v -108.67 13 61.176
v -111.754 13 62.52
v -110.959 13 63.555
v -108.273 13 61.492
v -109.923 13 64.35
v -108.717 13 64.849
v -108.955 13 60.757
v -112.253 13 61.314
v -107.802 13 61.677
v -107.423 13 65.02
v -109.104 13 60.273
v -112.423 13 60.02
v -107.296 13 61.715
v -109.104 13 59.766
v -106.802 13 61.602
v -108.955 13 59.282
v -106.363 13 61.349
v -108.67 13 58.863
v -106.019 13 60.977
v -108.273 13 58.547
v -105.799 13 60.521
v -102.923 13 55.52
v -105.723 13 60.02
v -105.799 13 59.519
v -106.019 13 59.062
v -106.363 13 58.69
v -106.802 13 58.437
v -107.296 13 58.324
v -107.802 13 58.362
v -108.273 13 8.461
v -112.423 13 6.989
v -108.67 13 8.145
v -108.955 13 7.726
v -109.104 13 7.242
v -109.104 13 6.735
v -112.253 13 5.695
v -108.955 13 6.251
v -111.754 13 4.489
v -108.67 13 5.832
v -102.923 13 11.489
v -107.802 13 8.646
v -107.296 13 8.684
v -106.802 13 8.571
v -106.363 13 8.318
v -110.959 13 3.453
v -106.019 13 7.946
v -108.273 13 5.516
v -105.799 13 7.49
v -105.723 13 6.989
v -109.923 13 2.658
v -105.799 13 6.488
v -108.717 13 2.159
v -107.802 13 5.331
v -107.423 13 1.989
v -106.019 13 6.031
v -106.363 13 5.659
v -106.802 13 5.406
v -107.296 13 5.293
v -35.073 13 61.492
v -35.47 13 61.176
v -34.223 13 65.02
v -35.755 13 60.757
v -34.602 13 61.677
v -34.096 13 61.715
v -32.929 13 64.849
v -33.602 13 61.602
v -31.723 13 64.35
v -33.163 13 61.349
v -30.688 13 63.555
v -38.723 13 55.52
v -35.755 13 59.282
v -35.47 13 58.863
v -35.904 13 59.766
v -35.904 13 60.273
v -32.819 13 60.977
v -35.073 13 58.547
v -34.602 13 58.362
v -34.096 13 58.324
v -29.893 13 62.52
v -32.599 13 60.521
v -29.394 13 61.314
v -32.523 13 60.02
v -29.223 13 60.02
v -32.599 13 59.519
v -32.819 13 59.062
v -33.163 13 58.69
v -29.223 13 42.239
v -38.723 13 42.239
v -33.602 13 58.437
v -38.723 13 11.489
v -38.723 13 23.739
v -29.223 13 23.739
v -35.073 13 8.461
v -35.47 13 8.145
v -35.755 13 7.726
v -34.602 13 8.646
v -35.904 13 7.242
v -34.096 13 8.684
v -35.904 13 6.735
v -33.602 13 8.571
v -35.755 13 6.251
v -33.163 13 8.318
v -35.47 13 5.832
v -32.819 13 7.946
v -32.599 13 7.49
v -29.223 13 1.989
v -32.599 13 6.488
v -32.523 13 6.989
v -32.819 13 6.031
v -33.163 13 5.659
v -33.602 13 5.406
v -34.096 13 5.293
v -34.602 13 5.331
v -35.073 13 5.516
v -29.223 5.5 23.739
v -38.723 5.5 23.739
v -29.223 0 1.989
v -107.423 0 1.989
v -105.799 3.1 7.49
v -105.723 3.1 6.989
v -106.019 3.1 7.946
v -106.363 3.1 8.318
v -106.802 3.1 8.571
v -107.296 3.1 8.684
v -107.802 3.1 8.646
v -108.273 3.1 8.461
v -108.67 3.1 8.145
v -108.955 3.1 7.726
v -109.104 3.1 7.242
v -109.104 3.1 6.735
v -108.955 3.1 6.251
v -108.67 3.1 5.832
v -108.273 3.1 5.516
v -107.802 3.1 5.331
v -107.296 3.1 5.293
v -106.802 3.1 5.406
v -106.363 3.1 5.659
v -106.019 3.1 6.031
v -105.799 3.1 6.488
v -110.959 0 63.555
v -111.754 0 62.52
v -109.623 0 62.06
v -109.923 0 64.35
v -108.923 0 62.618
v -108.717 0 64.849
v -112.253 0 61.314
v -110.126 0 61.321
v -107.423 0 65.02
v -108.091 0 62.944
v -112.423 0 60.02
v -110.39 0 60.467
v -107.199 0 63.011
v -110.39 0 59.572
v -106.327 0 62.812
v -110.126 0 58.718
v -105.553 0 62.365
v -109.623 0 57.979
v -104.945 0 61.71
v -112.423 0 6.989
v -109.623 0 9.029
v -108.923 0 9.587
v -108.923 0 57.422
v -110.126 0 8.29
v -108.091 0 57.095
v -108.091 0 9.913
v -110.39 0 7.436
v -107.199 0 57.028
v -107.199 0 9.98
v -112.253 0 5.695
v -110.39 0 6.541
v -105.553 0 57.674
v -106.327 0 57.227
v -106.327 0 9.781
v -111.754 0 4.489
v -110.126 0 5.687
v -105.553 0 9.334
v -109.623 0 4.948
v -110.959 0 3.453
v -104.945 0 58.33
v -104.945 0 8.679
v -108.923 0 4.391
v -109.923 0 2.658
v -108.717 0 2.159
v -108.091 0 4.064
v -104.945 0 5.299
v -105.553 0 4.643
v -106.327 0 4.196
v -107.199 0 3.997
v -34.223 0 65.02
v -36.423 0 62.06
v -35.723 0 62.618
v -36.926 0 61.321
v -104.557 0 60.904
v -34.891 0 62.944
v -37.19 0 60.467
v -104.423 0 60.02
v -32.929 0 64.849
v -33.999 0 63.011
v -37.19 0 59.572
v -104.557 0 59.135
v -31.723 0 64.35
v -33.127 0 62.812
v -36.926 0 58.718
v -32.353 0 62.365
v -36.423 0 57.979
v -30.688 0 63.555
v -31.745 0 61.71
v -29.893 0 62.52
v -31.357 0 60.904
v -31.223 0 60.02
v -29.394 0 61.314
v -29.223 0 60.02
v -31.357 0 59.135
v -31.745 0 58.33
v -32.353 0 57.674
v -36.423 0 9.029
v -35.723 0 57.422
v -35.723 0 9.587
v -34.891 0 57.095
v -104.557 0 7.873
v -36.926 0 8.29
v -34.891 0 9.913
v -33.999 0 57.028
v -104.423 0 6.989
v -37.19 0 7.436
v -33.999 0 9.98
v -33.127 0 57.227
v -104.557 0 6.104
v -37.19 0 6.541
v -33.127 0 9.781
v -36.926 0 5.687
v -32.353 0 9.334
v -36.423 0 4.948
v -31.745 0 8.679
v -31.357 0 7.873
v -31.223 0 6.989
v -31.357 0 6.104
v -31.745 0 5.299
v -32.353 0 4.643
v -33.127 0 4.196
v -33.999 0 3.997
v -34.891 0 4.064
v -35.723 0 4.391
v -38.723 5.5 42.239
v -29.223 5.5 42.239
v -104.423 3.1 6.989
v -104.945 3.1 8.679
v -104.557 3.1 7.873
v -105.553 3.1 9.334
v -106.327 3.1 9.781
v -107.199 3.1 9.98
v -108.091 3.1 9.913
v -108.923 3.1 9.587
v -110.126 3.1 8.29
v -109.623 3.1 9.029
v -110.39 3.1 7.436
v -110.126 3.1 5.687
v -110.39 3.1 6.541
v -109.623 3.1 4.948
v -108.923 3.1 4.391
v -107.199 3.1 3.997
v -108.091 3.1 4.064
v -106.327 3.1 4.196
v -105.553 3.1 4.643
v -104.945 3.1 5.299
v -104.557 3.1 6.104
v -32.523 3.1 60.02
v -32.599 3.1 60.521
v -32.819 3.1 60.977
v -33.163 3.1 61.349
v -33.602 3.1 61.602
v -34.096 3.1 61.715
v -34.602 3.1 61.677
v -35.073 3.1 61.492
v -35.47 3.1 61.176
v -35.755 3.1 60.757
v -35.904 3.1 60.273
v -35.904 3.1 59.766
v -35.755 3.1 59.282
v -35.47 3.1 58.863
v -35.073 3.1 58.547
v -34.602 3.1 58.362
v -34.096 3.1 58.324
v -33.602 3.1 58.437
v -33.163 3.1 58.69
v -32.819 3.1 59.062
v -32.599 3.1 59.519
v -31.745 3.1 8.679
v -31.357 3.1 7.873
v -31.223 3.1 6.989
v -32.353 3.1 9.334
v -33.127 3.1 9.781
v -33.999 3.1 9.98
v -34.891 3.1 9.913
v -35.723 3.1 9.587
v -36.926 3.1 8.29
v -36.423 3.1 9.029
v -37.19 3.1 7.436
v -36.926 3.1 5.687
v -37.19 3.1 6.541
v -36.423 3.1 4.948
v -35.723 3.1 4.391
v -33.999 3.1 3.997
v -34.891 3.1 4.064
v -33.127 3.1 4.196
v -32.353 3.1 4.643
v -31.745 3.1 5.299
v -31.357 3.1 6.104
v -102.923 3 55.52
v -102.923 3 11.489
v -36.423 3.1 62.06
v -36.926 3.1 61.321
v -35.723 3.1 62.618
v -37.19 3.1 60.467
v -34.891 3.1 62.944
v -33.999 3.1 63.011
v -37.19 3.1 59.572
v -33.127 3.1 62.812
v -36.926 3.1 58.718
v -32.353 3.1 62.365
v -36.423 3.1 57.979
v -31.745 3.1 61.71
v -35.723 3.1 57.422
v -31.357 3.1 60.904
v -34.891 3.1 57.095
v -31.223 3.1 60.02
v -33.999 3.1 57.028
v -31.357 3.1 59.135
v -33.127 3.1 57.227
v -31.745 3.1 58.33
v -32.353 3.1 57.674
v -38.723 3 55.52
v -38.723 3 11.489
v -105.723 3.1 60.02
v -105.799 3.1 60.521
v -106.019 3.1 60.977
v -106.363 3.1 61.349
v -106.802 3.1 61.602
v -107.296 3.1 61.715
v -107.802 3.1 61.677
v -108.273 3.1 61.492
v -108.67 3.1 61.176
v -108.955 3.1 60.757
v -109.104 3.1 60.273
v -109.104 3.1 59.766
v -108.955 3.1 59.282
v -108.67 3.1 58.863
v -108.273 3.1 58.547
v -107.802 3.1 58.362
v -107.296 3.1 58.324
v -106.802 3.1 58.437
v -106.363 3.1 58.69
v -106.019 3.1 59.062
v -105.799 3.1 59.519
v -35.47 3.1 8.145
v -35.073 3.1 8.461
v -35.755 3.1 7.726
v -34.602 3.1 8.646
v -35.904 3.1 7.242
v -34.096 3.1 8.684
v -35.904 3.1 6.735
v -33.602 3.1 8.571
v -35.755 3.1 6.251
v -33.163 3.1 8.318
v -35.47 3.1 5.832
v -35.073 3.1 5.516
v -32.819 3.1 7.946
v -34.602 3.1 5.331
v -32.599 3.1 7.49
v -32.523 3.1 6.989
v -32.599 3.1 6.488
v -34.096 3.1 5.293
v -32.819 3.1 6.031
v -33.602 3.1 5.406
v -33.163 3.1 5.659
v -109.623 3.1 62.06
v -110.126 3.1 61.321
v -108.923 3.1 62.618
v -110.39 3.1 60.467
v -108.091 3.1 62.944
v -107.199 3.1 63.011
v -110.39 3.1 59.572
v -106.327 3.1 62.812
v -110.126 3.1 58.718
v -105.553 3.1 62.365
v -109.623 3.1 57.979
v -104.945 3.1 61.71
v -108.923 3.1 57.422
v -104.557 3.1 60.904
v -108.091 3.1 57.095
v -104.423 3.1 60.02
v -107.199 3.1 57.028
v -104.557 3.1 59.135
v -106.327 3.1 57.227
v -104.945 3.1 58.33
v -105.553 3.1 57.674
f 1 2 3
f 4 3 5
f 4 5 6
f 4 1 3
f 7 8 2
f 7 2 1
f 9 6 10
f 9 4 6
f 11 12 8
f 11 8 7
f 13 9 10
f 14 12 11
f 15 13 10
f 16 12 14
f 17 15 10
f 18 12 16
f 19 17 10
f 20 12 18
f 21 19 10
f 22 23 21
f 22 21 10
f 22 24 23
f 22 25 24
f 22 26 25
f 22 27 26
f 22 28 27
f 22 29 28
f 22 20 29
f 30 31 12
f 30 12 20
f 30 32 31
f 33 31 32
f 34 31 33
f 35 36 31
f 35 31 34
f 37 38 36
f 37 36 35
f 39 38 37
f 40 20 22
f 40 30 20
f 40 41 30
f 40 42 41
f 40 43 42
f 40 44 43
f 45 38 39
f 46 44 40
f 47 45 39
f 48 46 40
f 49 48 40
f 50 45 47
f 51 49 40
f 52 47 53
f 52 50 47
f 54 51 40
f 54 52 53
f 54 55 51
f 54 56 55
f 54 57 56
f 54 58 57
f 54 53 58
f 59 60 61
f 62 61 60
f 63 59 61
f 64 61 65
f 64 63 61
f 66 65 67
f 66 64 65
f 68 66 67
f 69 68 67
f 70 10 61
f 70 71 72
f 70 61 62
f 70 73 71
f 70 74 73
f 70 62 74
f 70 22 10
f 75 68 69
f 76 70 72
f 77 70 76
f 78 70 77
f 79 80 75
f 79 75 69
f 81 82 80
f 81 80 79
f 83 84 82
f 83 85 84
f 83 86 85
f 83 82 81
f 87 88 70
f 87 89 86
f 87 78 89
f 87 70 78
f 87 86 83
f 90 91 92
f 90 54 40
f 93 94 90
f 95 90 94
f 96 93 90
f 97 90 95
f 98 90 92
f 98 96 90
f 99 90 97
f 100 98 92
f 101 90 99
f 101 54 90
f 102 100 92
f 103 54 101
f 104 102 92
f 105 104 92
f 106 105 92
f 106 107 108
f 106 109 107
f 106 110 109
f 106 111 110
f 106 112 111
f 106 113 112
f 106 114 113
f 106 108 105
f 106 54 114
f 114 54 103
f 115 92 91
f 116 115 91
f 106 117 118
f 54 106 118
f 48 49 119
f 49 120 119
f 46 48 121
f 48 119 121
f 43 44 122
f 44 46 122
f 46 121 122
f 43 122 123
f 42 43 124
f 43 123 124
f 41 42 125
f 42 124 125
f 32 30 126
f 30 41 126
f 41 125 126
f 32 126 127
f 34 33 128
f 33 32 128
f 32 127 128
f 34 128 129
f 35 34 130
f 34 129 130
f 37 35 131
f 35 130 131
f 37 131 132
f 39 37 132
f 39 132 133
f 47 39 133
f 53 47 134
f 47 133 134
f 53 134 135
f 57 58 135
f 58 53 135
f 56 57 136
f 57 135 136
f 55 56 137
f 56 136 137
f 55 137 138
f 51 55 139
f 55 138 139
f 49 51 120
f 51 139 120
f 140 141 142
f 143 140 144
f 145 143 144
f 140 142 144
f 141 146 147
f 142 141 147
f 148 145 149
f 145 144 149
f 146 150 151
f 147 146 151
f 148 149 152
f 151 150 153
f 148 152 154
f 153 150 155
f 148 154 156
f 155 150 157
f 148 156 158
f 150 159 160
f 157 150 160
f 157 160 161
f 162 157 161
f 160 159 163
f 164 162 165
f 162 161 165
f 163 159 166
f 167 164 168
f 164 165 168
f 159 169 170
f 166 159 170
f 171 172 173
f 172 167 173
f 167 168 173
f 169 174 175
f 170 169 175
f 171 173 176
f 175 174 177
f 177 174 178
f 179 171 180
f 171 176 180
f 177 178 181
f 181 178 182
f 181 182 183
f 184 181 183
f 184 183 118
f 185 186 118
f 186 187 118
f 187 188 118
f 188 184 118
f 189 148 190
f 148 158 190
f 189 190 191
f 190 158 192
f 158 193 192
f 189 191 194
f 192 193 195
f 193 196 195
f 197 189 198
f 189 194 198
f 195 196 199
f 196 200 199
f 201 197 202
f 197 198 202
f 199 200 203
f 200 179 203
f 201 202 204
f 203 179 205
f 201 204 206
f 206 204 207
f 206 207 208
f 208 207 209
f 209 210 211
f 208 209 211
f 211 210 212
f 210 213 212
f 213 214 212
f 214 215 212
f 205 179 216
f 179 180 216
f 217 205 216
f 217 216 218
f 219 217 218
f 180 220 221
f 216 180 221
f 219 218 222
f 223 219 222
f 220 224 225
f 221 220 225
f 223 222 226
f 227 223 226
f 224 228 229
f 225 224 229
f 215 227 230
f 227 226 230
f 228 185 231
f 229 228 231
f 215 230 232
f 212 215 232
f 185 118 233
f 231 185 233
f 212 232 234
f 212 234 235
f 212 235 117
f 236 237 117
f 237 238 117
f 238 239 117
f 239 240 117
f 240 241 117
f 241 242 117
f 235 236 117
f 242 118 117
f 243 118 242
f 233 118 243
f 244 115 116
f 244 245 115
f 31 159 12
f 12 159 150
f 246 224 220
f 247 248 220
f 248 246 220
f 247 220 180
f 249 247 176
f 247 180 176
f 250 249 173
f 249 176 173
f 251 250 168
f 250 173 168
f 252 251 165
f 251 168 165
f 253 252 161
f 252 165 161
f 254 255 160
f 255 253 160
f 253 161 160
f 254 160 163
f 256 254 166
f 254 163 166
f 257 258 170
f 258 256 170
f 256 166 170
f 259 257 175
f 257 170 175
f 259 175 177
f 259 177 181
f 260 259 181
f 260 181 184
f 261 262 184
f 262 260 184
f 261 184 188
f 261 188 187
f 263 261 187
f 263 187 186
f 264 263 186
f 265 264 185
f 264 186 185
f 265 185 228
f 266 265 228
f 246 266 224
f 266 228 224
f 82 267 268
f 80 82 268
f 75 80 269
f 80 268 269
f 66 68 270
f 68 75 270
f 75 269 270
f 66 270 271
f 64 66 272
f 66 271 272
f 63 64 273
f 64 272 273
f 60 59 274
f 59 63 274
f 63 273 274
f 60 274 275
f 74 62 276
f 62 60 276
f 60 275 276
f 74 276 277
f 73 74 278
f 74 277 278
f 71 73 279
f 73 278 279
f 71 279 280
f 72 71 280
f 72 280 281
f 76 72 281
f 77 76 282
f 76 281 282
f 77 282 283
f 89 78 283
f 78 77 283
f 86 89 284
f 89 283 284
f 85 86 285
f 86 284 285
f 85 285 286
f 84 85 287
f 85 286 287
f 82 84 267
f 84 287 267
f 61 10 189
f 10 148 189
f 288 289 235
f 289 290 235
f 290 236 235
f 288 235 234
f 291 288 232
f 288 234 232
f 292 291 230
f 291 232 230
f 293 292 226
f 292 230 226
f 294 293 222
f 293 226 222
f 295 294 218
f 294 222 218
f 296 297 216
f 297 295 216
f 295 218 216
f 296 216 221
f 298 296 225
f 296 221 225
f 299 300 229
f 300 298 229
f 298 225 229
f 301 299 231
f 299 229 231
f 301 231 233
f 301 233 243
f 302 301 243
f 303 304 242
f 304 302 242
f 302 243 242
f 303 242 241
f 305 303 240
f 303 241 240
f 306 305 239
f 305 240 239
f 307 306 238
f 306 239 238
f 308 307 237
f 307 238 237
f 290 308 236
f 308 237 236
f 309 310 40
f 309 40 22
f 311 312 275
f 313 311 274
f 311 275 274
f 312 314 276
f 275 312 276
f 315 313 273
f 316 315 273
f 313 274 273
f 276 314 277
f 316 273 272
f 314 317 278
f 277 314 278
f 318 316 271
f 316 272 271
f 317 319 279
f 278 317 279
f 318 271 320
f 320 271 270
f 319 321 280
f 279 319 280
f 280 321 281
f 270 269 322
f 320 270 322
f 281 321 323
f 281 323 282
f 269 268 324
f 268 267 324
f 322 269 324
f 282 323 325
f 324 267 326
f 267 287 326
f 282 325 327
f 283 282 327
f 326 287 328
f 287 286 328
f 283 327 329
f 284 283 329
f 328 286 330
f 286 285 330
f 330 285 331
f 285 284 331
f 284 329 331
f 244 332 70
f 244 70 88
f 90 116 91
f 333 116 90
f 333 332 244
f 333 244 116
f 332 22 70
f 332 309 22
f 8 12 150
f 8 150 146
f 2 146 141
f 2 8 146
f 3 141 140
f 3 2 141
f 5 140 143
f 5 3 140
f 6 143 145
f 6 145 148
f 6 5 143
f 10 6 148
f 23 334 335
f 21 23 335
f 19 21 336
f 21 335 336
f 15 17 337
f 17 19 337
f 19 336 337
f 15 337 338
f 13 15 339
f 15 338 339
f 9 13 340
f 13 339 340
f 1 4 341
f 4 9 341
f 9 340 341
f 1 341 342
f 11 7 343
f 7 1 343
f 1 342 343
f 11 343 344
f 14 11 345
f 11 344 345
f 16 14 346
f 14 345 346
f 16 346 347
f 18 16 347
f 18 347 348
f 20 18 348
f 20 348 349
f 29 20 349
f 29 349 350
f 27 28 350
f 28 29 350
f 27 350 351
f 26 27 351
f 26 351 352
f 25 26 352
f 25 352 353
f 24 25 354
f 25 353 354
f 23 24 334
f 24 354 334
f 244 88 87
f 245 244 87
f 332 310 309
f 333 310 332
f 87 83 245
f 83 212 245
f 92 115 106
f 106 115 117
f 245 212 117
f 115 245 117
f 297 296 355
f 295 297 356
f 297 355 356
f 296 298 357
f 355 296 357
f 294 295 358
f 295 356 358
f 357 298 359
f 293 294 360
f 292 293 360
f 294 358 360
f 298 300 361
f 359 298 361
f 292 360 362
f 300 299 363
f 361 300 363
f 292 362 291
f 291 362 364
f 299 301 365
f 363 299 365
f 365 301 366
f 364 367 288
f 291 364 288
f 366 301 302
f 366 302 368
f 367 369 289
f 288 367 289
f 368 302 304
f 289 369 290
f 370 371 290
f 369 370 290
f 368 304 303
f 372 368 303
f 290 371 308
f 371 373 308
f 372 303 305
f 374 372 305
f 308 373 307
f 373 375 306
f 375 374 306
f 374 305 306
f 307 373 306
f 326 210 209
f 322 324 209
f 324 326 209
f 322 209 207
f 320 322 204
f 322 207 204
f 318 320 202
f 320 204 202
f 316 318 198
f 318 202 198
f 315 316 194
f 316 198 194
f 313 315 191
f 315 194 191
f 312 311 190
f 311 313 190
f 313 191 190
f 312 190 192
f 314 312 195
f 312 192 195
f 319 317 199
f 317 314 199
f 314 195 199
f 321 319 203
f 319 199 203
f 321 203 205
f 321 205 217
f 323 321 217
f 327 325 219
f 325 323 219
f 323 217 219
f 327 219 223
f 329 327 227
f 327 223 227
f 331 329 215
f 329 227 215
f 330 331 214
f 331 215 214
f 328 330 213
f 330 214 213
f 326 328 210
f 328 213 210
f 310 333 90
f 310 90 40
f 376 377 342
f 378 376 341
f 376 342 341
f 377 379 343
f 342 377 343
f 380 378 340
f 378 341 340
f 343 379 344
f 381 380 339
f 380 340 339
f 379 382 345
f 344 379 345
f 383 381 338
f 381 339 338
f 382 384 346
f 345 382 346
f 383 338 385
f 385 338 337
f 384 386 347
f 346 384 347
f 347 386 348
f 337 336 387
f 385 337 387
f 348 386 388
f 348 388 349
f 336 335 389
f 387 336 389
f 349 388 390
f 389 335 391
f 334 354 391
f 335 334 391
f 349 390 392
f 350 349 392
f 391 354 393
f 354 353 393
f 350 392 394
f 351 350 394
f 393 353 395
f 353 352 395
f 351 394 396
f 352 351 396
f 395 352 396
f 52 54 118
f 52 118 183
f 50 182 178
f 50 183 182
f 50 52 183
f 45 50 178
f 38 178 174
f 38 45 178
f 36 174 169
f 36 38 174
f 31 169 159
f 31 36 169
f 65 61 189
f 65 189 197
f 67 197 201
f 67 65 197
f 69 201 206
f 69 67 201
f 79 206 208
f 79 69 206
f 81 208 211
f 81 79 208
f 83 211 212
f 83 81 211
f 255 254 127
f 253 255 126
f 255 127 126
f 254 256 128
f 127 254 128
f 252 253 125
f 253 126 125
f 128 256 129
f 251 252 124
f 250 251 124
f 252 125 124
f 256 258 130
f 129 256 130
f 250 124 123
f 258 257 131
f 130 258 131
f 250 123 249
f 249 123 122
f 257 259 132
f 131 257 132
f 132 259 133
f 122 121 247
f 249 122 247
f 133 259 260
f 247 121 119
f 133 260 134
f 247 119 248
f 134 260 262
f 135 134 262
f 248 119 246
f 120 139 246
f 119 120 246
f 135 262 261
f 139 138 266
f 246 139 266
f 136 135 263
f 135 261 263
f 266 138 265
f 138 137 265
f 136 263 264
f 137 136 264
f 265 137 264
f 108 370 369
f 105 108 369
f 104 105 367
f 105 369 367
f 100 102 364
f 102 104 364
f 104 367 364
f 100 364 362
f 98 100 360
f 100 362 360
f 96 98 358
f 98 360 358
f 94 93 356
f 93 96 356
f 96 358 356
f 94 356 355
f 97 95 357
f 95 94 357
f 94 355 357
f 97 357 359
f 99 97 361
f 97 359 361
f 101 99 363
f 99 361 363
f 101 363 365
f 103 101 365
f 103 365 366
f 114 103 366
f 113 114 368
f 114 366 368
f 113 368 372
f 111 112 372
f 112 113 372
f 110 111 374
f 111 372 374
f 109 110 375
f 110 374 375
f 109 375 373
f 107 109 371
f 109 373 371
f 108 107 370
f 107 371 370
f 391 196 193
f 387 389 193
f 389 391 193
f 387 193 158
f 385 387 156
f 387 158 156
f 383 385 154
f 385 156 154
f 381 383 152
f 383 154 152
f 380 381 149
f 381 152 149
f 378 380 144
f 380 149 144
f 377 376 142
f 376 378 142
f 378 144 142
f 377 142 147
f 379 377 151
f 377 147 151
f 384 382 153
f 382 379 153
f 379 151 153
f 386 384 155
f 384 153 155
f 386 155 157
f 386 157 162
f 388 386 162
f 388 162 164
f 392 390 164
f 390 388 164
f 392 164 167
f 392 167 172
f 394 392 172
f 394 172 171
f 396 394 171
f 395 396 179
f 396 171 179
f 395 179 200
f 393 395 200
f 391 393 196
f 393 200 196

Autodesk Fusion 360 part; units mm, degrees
sketch "Sketch1" plane through (0, 0, 0) normal (0, 1, 0) x (1, 0, 0)
  line L0 (-102.9234, -55.5196) -> (-38.7234, -55.5196)
  line L1 (-38.7234, -55.5196) -> (-38.7234, -11.4886)
  line L2 (-38.7234, -11.4886) -> (-102.9234, -11.4886)
  line L3 (-102.9234, -11.4886) -> (-102.9234, -55.5196)
  line L4 (-112.4234, -65.0196) -> (-29.2234, -65.0196)
  line L5 (-29.2234, -65.0196) -> (-29.2234, -1.9886)
  line L6 (-29.2234, -1.9886) -> (-112.4234, -1.9886)
  line L7 (-112.4234, -1.9886) -> (-112.4234, -65.0196)
  circle A0 centre (-107.4234, -60.0196) radius 1.7
  circle A1 centre (-34.2234, -60.0196) radius 1.7
  circle A2 centre (-107.4234, -6.9886) radius 1.7
  circle A3 centre (-34.2234, -6.9886) radius 1.7
  circle A4 centre (-107.4234, -60.0196) radius 3
  circle A5 centre (-107.4234, -6.9886) radius 3
  circle A6 centre (-34.2234, -6.9886) radius 3
  circle A7 centre (-34.2234, -60.0196) radius 3
  dimension "d1" = 64.2
  dimension "d2" = 44.031
  dimension "d3" = 83.2
  dimension "d4" = 63.031
  dimension "d5" = 9.5
  dimension "d6" = 9.5
  dimension "d7" = 3.4
  dimension "d8" = 3.4
  dimension "d9" = 3.4
  dimension "d10" = 3.4
  dimension "d11" = 5
  dimension "d12" = 5
  dimension "d13" = 5
  dimension "d14" = 5
  dimension "d15" = 5
  dimension "d16" = 5
  dimension "d17" = 5
  dimension "d18" = 5
  dimension "d19" = 6
  dimension "d20" = 6
  dimension "d21" = 6
  dimension "d22" = 6
extrude "Extrude1" add sketch "Sketch1" along normal blind 9.9 from surface at 3.1 contours A4 | A5 | A6 | A7 makes body 1 at (-37.2197, 9.7, 60.1692) makes body 2 at (-31.2271, 9.7, 7.1382) makes body 3 at (-109.5181, 9.7, 62.1672) makes body 4 at (-104.4271, 9.7, 7.1382)
extrude "Extrude2" add sketch "Sketch1" along normal blind 13 contours L4 L5 L6 L7 bodies 1 2 3 4
extrude "Extrude3" add sketch "Sketch1" along normal blind 3 contours L0 L1 L2 L3 bodies 1
sketch "Sketch2" plane through (0, 13, 0) normal (0, 1, 0) x (-1, 0, 0)
  circle A0 centre (34.2234, 60.0196) radius 1.7
  circle A1 centre (107.4234, 6.9886) radius 1.7
  line L0 (102.9234, 55.5196) -> (102.9234, 11.4886)
  line L1 (102.9234, 11.4886) -> (38.7234, 11.4886)
  line L2 (38.7234, 11.4886) -> (38.7234, 55.5196)
  line L3 (38.7234, 55.5196) -> (102.9234, 55.5196)
  line L4 (112.4234, 1.9886) -> (112.4234, 65.0196)
  line L5 (112.4234, 65.0196) -> (29.2234, 65.0196)
  line L6 (29.2234, 65.0196) -> (29.2234, 1.9886)
  line L7 (29.2234, 1.9886) -> (112.4234, 1.9886)
  circle A2 centre (34.2234, 6.9886) radius 1.7
  circle A3 centre (107.4234, 60.0196) radius 1.7
  line L8 (29.2234, 23.7386) -> (38.7234, 23.7386)
  line L9 (38.7234, 23.7386) -> (38.7234, 42.2386)
  line L10 (38.7234, 42.2386) -> (29.2234, 42.2386)
  line L11 (29.2234, 42.2386) -> (29.2234, 23.7386)
  line L12 (29.2234, 1.9886) -> (112.4234, 1.9886)
  dimension "d30" = 18.5
  dimension "d31" = 21.75
extrude "Extrude4" cut sketch "Sketch2" against normal blind 7.5 contours L2 L6 L8 L9 L10 L11 bodies 1
fillet "Fillet1" radius 5 1 edges at (-112.4234, 6.5, 65.0196) on bodies 1
fillet "Fillet2" radius 5 1 edges at (-112.4234, 6.5, 1.9886) on bodies 1
fillet "Fillet3" radius 5 1 edges at (-29.2234, 6.5, 65.0196) on bodies 1
